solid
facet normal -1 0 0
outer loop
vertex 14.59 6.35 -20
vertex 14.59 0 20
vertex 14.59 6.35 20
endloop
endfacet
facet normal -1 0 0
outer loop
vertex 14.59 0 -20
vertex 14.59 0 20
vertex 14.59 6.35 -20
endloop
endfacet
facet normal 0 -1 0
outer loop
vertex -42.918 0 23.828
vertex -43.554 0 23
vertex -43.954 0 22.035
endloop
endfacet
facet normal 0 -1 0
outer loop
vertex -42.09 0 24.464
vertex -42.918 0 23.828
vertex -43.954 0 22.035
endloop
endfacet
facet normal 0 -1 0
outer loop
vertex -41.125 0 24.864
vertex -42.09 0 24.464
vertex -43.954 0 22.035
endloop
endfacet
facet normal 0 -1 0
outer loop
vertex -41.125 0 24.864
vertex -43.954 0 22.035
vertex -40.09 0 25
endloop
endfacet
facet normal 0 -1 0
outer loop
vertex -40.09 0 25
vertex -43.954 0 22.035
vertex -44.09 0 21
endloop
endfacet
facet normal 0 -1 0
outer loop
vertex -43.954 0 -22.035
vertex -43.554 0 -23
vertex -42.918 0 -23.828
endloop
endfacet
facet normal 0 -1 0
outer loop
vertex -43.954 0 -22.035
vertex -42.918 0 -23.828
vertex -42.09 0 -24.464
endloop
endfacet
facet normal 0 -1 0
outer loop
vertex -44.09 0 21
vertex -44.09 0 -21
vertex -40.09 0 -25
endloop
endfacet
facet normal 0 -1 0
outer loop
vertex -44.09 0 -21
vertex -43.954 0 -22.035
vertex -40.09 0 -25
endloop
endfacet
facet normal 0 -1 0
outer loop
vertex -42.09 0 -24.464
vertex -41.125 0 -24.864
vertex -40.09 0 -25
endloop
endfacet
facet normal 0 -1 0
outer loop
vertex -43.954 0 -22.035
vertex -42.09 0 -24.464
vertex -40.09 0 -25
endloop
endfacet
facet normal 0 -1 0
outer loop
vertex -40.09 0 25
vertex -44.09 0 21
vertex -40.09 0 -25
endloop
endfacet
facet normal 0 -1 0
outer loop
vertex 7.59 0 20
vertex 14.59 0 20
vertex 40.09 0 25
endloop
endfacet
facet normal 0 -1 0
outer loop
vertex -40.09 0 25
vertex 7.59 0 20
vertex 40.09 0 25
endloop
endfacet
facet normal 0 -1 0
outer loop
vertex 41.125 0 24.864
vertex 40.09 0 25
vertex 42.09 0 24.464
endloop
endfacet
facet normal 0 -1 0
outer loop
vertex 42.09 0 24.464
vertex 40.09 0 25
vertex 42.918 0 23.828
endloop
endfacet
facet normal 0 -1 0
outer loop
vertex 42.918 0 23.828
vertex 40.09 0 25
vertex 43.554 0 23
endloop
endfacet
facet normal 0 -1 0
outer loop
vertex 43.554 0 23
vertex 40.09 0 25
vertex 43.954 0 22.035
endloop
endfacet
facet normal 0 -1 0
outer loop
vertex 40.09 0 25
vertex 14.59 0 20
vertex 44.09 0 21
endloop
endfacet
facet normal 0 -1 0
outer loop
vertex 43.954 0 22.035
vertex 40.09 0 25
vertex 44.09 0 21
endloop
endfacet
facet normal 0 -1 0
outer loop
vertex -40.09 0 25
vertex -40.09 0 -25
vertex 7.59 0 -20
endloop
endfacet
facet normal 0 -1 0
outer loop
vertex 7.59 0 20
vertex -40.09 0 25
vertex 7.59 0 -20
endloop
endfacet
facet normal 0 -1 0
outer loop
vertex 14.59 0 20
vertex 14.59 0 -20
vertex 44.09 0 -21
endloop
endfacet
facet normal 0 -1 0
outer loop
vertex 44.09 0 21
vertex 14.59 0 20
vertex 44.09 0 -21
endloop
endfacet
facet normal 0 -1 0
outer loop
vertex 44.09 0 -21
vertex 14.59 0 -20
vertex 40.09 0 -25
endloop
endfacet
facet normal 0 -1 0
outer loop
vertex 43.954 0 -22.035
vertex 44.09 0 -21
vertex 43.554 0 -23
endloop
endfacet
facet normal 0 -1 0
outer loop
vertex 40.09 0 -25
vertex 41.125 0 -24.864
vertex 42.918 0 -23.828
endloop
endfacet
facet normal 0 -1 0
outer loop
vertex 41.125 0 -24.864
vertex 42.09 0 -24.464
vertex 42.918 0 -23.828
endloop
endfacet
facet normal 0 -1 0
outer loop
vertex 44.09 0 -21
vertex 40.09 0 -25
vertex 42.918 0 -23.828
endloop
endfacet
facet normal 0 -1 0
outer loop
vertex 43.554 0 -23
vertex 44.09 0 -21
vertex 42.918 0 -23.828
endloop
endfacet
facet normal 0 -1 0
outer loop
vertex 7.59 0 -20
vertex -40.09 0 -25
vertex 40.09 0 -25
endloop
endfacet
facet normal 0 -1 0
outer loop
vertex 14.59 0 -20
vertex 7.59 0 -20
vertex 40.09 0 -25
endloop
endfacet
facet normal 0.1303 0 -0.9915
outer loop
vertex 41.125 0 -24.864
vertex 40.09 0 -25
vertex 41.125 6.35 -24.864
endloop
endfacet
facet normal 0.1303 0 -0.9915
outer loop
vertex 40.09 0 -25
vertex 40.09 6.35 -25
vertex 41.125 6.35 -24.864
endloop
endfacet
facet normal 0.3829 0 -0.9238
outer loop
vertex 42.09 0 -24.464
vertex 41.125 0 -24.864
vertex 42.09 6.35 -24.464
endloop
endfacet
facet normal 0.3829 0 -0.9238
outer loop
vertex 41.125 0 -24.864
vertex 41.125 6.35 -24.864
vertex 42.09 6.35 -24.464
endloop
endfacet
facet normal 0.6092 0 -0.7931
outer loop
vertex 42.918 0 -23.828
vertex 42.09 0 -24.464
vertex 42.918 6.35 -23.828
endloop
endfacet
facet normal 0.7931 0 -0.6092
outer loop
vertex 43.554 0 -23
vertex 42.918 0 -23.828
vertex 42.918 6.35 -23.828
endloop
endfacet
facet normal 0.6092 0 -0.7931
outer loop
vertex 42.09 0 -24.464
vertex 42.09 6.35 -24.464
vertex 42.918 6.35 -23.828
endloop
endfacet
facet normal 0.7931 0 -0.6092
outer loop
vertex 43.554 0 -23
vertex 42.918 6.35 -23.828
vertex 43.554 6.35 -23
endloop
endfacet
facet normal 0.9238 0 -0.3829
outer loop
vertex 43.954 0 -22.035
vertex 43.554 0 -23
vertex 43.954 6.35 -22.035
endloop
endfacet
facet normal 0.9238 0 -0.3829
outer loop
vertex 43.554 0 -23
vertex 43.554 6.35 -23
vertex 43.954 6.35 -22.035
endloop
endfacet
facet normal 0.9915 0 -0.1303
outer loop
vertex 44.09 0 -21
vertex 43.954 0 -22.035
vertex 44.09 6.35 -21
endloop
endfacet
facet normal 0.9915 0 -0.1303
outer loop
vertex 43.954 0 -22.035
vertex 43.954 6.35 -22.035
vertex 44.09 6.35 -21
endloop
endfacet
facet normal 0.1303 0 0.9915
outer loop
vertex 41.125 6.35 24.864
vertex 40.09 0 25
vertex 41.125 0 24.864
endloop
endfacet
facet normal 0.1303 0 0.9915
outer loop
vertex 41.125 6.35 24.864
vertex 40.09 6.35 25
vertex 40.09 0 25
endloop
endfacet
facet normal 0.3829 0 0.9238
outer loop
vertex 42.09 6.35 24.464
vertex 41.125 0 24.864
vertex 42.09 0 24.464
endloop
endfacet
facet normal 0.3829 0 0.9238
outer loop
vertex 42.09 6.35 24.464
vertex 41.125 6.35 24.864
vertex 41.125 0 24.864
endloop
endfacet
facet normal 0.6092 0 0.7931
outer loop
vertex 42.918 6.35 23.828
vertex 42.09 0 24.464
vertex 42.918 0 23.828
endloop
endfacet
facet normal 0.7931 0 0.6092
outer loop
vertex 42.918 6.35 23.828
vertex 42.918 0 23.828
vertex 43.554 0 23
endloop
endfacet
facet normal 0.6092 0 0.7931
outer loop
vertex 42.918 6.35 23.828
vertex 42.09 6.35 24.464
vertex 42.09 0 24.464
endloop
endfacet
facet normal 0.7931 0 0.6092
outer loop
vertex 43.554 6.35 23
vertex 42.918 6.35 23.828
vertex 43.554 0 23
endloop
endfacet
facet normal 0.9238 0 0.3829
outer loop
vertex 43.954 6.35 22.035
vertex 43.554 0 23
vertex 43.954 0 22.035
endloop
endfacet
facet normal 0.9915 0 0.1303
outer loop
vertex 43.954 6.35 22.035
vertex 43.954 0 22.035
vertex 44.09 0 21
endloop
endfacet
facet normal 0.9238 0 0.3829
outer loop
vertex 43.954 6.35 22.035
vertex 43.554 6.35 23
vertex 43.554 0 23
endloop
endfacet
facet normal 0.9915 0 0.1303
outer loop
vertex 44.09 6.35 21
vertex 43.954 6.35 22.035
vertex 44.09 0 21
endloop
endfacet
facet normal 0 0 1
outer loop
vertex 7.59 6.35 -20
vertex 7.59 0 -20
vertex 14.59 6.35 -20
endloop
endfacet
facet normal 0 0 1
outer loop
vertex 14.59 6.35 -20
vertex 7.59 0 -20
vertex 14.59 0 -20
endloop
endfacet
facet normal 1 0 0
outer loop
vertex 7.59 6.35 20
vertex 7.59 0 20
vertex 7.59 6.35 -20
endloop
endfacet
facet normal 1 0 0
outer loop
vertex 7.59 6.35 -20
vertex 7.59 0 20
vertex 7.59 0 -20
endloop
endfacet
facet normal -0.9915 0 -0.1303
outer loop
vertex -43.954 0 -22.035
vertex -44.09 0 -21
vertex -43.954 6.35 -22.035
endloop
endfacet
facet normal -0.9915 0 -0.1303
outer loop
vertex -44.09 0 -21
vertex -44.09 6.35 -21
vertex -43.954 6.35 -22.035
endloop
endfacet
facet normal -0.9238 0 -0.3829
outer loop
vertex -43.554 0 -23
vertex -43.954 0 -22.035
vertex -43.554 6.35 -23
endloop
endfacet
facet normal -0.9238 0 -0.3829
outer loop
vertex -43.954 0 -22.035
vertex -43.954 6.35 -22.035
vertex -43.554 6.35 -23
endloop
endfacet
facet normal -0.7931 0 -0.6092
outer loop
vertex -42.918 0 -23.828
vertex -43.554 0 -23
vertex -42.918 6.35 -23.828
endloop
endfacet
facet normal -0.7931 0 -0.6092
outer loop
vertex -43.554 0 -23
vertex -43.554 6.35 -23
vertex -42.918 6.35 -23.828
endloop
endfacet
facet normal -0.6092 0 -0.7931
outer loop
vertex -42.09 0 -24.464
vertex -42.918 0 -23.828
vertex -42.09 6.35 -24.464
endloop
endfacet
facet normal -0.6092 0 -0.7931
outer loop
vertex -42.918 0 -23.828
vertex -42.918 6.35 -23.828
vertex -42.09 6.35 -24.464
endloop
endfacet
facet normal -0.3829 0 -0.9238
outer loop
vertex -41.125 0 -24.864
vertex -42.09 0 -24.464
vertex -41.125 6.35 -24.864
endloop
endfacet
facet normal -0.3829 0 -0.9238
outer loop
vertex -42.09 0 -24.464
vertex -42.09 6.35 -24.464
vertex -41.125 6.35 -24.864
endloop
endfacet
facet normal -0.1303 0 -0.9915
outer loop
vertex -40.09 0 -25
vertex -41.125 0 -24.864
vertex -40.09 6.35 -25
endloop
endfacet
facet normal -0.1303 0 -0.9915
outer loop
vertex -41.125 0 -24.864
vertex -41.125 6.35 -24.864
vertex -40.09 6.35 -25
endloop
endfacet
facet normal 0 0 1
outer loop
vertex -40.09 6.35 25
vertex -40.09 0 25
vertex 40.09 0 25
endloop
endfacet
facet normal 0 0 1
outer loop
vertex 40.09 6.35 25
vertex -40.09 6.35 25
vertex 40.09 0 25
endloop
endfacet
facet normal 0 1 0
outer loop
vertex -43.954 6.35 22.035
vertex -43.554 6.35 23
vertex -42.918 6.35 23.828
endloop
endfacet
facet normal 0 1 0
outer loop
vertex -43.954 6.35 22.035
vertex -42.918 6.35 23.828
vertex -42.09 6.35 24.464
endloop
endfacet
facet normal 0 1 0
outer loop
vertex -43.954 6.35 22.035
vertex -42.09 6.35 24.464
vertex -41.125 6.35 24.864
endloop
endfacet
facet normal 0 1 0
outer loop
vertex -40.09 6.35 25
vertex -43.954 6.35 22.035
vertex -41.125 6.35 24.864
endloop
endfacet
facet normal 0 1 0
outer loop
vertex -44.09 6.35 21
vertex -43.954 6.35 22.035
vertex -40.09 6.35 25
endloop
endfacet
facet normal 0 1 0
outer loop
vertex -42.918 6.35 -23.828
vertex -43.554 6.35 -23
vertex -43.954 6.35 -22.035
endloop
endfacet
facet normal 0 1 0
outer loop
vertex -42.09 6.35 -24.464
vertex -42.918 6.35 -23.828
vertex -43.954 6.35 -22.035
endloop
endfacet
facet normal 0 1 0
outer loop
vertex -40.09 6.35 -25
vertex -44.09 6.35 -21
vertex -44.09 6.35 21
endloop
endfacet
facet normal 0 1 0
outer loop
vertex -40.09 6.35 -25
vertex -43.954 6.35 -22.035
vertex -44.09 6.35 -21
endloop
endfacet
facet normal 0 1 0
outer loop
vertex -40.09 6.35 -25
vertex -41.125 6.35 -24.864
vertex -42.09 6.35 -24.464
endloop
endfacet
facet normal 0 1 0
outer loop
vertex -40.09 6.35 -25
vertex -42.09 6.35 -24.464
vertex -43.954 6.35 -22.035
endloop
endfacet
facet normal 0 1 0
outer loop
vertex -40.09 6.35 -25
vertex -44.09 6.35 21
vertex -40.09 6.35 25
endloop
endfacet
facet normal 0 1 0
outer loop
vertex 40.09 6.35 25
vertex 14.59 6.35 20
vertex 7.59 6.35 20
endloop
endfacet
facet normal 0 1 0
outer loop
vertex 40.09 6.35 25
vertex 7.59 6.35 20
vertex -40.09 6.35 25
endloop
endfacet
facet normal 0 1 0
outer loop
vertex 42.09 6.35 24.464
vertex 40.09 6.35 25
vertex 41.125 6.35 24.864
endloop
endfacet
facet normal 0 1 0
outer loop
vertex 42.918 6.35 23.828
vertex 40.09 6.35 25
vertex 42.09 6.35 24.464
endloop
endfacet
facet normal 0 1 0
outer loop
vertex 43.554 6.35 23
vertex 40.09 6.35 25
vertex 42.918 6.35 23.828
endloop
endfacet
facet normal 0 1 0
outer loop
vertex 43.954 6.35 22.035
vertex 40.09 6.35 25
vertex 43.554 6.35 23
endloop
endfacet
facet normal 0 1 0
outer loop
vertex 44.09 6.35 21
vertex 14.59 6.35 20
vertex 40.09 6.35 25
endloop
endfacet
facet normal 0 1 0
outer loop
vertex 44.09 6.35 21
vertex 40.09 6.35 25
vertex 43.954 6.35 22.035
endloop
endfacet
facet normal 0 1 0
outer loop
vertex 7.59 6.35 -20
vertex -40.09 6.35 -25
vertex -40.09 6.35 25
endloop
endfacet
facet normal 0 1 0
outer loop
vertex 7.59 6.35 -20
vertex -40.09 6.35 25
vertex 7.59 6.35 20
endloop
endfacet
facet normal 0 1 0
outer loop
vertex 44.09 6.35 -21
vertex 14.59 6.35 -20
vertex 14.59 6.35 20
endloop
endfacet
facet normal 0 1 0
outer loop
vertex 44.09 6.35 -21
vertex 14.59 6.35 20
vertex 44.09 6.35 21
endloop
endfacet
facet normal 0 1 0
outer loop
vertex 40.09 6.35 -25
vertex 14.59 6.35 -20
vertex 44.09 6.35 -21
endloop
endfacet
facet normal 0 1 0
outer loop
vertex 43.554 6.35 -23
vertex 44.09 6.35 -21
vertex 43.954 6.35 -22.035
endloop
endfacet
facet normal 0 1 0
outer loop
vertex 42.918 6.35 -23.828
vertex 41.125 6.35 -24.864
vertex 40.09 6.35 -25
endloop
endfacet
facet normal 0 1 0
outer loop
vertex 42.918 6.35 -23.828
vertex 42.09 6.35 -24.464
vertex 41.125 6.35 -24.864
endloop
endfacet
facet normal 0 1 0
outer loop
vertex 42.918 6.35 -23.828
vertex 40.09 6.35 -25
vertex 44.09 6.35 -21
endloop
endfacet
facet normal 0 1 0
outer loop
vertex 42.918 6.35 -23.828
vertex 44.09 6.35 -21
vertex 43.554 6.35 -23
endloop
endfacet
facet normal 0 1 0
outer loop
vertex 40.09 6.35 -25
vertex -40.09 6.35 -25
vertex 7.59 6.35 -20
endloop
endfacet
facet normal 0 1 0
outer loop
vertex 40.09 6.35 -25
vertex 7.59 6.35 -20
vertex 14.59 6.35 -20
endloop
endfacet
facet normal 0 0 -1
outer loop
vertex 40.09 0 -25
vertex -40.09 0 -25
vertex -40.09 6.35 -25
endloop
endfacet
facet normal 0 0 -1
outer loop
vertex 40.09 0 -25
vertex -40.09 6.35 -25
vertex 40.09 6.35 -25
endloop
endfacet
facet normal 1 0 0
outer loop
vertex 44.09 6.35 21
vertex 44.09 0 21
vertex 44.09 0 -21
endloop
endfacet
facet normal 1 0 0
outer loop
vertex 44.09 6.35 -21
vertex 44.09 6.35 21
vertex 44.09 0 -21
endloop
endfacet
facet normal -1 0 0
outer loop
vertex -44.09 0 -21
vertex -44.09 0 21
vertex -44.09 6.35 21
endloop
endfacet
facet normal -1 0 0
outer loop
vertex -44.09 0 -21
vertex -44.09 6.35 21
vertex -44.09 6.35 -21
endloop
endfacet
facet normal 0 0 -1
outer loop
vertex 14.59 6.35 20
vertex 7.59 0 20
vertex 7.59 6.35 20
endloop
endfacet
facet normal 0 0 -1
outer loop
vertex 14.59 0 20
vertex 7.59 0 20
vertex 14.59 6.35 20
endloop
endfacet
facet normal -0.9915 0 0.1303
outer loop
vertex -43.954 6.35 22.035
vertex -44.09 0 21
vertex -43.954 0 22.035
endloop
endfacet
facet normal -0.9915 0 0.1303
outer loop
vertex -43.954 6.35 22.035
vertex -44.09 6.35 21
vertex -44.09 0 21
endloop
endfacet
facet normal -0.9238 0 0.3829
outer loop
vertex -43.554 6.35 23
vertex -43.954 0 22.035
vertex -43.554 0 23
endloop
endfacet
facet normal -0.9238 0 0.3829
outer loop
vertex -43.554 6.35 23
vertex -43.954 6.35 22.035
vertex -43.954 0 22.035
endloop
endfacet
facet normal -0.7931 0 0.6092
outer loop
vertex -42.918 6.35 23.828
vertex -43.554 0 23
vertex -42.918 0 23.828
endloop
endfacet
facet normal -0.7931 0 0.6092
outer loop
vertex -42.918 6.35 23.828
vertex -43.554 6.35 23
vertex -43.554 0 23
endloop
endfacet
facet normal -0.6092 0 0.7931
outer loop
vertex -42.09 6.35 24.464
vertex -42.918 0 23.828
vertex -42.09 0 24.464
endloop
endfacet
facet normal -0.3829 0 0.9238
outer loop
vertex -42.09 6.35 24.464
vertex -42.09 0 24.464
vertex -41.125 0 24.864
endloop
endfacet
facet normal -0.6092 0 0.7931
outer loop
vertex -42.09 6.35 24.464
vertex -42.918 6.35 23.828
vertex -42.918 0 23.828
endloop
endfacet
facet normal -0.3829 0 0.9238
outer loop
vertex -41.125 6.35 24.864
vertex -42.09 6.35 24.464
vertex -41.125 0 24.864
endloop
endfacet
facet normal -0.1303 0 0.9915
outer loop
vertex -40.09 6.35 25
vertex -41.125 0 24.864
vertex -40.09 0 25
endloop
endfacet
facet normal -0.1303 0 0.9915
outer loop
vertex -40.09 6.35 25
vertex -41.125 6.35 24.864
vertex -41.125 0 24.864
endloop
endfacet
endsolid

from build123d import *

# Parameters (mm, degrees)
SKETCH1_W           = 88.18
SKETCH1_H           = 50
SKETCH1_W_2         = 7
SKETCH1_H_2         = 40
BOSS_EXTRUDE1_DEPTH = 6.35
FILLET1_R           = 4


with BuildPart() as part:
    # Sketch1 → Boss-Extrude1 (new body)
    with BuildSketch(Plane(origin=(0, 0, 0), x_dir=(1, 0, 0), z_dir=(0, 1, 0))):
        Rectangle(SKETCH1_W, SKETCH1_H)
        with Locations((11.09, 0)):
            Rectangle(SKETCH1_W_2, SKETCH1_H_2, mode=Mode.SUBTRACT)
    extrude(amount=BOSS_EXTRUDE1_DEPTH)

    # Fillet1
    fillet1_edges = [part.edges().sort_by_distance(p)[0] for p in [
        (44.09, 3.175, 25),
        (-44.09, 3.175, 25),
        (-44.09, 3.175, -25),
        (44.09, 3.175, -25),
    ]]
    fillet(fillet1_edges, radius=FILLET1_R)


solid = part.part
